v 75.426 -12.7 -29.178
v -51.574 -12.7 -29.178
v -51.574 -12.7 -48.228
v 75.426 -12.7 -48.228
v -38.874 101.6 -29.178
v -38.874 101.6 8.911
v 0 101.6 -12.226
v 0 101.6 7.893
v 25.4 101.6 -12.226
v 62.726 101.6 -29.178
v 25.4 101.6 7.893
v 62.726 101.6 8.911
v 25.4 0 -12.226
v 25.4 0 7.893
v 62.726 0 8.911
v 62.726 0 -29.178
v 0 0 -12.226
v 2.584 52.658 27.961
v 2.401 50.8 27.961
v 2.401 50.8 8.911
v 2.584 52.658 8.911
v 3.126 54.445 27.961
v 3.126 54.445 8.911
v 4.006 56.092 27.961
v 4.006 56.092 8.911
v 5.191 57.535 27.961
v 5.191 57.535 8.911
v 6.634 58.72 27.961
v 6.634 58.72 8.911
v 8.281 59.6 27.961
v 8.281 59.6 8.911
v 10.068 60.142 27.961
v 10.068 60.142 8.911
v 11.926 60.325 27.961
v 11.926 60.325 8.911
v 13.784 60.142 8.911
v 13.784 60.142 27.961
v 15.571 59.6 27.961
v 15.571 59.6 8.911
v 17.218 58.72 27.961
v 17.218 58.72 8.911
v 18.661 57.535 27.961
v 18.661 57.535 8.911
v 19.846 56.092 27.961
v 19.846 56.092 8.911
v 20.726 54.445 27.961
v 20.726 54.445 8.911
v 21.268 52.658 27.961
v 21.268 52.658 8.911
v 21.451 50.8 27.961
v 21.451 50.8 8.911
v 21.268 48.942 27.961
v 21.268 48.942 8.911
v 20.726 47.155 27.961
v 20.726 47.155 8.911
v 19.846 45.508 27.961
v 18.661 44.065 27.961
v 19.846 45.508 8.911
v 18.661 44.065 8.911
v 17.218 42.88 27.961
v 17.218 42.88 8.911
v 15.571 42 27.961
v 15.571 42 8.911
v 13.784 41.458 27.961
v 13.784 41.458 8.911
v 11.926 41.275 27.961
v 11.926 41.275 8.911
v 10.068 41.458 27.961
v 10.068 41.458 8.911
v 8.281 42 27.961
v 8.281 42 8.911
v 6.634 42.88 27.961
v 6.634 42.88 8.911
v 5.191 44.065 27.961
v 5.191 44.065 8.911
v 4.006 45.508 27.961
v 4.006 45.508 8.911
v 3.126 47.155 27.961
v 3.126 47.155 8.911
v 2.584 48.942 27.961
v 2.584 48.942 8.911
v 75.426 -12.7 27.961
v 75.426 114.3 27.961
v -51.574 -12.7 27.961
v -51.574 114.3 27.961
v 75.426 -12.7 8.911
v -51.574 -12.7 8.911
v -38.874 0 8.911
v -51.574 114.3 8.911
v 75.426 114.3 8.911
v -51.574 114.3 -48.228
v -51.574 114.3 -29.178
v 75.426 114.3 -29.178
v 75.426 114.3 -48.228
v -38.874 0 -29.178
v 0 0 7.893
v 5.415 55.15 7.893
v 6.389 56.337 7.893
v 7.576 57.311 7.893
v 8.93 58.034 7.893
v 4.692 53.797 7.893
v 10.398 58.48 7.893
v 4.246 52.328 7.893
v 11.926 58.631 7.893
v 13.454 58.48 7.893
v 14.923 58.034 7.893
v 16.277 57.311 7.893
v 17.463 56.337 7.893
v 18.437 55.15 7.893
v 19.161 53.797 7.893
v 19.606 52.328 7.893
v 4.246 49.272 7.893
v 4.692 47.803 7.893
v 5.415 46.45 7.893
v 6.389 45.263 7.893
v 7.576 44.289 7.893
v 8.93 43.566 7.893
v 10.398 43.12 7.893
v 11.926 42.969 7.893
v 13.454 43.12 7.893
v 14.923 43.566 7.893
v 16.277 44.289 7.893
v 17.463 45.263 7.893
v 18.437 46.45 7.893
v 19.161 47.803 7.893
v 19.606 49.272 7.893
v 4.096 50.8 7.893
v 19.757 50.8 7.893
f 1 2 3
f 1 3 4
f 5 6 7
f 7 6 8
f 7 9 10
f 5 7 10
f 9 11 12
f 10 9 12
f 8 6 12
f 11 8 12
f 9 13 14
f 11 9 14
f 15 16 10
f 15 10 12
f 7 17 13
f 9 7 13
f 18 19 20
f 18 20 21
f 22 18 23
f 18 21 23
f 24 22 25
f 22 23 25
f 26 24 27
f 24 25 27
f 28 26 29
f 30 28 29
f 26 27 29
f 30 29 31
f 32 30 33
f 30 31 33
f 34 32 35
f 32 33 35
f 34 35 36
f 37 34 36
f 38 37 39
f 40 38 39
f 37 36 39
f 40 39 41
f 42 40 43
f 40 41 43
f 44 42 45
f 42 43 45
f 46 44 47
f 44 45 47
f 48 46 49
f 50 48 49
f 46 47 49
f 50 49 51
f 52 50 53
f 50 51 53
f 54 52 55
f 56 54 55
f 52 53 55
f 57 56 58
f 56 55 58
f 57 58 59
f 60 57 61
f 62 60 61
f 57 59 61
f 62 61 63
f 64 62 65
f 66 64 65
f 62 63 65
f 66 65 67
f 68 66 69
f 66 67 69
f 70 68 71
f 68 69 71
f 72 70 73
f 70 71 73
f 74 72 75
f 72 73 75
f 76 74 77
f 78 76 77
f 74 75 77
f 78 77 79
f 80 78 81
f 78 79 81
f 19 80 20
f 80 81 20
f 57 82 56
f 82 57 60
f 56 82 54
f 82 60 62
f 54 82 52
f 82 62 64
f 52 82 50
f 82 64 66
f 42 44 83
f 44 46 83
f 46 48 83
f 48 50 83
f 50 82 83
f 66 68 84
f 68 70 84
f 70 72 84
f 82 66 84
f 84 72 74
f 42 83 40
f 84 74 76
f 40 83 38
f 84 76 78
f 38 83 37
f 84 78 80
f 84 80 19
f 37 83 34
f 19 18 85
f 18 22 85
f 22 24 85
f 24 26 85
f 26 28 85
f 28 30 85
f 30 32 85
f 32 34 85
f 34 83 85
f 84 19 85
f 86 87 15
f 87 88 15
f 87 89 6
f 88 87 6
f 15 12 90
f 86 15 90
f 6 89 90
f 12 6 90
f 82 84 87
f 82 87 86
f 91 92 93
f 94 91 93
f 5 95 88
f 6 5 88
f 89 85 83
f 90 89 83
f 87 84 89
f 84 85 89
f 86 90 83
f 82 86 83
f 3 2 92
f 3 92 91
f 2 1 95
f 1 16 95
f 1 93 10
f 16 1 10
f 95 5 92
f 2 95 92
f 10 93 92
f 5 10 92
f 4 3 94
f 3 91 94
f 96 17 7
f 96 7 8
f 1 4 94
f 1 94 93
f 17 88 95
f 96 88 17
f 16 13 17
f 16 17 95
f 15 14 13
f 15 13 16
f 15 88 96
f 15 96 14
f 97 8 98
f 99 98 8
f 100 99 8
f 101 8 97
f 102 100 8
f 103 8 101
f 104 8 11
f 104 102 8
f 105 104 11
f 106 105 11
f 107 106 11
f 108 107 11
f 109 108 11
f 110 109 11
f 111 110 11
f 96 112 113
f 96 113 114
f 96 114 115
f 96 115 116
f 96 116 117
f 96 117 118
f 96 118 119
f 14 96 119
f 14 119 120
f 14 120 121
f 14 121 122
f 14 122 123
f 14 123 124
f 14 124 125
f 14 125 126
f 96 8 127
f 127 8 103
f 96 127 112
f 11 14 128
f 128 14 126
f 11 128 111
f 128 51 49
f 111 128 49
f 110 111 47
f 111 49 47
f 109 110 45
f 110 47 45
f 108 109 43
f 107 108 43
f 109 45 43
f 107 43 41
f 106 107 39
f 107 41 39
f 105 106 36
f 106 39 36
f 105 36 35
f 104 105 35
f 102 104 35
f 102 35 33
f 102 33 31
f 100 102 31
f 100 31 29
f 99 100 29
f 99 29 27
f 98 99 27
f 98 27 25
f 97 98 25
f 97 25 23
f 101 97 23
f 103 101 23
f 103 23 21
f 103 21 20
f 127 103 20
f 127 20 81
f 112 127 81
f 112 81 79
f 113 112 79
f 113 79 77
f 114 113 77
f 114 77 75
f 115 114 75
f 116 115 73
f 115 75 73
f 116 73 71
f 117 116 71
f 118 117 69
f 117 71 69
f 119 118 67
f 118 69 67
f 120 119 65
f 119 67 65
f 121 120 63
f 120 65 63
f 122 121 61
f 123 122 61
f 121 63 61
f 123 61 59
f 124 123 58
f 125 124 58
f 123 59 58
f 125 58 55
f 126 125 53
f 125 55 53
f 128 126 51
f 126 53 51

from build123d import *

# Parameters (mm, degrees)
F0_W          = 101.6
F0_H          = 38.089089331
F1_DEPTH      = 101.6
F2_DEPTH      = 114.3
F2_DEPTH_BACK = 12.7
F3_W          = 25.4
F3_H          = 20.1185690239
F4_DEPTH      = 114.301
F6_D          = 19.05
F6_DEPTH      = 19.05
F6_TIP        = 5.7231973962


with BuildPart() as f1:
    # F0 (on Front) → F1 (new body)
    with BuildSketch(Plane.XZ):
        with Locations((11.9261237085, -10.133718954)):
            Rectangle(F0_W, F0_H)
    extrude(amount=-F1_DEPTH)

    # F0 (on Front) → F2 (join, two sides)
    with BuildSketch(Plane.XZ) as f2_sk:
        Polygon((75.4261237085, 27.9608257115), (-51.5738762915, 27.9608257115), (-51.5738762915, 8.9108257115), (-38.8738762915, 8.9108257115), (62.7261237085, 8.9108257115), (75.4261237085, 8.9108257115), align=None)
        Polygon((62.7261237085, -29.1782636195), (-38.8738762915, -29.1782636195), (-51.5738762915, -29.1782636195), (-51.5738762915, -48.2282636195), (75.4261237085, -48.2282636195), (75.4261237085, -29.1782636195), align=None)
    extrude(amount=-F2_DEPTH)
    extrude(f2_sk.sketch, amount=F2_DEPTH_BACK)

    # F3 (on Front) → F4 (cut, through all)
    with BuildSketch(Plane.XZ):
        with Locations((12.7, -2.1666153334)):
            Rectangle(F3_W, F3_H)
    extrude(amount=-F4_DEPTH, mode=Mode.SUBTRACT)

    # F6
    with Locations(Plane.XY.offset(27.9608257115)):
        with Locations((11.9261237085, 50.8)):
            Hole(F6_D / 2, depth=F6_DEPTH)
            with Locations((0, 0, -(F6_DEPTH + F6_TIP / 2))):  # 118° drill point
                Cone(0, F6_D / 2, F6_TIP, mode=Mode.SUBTRACT)


solid = f1.part
